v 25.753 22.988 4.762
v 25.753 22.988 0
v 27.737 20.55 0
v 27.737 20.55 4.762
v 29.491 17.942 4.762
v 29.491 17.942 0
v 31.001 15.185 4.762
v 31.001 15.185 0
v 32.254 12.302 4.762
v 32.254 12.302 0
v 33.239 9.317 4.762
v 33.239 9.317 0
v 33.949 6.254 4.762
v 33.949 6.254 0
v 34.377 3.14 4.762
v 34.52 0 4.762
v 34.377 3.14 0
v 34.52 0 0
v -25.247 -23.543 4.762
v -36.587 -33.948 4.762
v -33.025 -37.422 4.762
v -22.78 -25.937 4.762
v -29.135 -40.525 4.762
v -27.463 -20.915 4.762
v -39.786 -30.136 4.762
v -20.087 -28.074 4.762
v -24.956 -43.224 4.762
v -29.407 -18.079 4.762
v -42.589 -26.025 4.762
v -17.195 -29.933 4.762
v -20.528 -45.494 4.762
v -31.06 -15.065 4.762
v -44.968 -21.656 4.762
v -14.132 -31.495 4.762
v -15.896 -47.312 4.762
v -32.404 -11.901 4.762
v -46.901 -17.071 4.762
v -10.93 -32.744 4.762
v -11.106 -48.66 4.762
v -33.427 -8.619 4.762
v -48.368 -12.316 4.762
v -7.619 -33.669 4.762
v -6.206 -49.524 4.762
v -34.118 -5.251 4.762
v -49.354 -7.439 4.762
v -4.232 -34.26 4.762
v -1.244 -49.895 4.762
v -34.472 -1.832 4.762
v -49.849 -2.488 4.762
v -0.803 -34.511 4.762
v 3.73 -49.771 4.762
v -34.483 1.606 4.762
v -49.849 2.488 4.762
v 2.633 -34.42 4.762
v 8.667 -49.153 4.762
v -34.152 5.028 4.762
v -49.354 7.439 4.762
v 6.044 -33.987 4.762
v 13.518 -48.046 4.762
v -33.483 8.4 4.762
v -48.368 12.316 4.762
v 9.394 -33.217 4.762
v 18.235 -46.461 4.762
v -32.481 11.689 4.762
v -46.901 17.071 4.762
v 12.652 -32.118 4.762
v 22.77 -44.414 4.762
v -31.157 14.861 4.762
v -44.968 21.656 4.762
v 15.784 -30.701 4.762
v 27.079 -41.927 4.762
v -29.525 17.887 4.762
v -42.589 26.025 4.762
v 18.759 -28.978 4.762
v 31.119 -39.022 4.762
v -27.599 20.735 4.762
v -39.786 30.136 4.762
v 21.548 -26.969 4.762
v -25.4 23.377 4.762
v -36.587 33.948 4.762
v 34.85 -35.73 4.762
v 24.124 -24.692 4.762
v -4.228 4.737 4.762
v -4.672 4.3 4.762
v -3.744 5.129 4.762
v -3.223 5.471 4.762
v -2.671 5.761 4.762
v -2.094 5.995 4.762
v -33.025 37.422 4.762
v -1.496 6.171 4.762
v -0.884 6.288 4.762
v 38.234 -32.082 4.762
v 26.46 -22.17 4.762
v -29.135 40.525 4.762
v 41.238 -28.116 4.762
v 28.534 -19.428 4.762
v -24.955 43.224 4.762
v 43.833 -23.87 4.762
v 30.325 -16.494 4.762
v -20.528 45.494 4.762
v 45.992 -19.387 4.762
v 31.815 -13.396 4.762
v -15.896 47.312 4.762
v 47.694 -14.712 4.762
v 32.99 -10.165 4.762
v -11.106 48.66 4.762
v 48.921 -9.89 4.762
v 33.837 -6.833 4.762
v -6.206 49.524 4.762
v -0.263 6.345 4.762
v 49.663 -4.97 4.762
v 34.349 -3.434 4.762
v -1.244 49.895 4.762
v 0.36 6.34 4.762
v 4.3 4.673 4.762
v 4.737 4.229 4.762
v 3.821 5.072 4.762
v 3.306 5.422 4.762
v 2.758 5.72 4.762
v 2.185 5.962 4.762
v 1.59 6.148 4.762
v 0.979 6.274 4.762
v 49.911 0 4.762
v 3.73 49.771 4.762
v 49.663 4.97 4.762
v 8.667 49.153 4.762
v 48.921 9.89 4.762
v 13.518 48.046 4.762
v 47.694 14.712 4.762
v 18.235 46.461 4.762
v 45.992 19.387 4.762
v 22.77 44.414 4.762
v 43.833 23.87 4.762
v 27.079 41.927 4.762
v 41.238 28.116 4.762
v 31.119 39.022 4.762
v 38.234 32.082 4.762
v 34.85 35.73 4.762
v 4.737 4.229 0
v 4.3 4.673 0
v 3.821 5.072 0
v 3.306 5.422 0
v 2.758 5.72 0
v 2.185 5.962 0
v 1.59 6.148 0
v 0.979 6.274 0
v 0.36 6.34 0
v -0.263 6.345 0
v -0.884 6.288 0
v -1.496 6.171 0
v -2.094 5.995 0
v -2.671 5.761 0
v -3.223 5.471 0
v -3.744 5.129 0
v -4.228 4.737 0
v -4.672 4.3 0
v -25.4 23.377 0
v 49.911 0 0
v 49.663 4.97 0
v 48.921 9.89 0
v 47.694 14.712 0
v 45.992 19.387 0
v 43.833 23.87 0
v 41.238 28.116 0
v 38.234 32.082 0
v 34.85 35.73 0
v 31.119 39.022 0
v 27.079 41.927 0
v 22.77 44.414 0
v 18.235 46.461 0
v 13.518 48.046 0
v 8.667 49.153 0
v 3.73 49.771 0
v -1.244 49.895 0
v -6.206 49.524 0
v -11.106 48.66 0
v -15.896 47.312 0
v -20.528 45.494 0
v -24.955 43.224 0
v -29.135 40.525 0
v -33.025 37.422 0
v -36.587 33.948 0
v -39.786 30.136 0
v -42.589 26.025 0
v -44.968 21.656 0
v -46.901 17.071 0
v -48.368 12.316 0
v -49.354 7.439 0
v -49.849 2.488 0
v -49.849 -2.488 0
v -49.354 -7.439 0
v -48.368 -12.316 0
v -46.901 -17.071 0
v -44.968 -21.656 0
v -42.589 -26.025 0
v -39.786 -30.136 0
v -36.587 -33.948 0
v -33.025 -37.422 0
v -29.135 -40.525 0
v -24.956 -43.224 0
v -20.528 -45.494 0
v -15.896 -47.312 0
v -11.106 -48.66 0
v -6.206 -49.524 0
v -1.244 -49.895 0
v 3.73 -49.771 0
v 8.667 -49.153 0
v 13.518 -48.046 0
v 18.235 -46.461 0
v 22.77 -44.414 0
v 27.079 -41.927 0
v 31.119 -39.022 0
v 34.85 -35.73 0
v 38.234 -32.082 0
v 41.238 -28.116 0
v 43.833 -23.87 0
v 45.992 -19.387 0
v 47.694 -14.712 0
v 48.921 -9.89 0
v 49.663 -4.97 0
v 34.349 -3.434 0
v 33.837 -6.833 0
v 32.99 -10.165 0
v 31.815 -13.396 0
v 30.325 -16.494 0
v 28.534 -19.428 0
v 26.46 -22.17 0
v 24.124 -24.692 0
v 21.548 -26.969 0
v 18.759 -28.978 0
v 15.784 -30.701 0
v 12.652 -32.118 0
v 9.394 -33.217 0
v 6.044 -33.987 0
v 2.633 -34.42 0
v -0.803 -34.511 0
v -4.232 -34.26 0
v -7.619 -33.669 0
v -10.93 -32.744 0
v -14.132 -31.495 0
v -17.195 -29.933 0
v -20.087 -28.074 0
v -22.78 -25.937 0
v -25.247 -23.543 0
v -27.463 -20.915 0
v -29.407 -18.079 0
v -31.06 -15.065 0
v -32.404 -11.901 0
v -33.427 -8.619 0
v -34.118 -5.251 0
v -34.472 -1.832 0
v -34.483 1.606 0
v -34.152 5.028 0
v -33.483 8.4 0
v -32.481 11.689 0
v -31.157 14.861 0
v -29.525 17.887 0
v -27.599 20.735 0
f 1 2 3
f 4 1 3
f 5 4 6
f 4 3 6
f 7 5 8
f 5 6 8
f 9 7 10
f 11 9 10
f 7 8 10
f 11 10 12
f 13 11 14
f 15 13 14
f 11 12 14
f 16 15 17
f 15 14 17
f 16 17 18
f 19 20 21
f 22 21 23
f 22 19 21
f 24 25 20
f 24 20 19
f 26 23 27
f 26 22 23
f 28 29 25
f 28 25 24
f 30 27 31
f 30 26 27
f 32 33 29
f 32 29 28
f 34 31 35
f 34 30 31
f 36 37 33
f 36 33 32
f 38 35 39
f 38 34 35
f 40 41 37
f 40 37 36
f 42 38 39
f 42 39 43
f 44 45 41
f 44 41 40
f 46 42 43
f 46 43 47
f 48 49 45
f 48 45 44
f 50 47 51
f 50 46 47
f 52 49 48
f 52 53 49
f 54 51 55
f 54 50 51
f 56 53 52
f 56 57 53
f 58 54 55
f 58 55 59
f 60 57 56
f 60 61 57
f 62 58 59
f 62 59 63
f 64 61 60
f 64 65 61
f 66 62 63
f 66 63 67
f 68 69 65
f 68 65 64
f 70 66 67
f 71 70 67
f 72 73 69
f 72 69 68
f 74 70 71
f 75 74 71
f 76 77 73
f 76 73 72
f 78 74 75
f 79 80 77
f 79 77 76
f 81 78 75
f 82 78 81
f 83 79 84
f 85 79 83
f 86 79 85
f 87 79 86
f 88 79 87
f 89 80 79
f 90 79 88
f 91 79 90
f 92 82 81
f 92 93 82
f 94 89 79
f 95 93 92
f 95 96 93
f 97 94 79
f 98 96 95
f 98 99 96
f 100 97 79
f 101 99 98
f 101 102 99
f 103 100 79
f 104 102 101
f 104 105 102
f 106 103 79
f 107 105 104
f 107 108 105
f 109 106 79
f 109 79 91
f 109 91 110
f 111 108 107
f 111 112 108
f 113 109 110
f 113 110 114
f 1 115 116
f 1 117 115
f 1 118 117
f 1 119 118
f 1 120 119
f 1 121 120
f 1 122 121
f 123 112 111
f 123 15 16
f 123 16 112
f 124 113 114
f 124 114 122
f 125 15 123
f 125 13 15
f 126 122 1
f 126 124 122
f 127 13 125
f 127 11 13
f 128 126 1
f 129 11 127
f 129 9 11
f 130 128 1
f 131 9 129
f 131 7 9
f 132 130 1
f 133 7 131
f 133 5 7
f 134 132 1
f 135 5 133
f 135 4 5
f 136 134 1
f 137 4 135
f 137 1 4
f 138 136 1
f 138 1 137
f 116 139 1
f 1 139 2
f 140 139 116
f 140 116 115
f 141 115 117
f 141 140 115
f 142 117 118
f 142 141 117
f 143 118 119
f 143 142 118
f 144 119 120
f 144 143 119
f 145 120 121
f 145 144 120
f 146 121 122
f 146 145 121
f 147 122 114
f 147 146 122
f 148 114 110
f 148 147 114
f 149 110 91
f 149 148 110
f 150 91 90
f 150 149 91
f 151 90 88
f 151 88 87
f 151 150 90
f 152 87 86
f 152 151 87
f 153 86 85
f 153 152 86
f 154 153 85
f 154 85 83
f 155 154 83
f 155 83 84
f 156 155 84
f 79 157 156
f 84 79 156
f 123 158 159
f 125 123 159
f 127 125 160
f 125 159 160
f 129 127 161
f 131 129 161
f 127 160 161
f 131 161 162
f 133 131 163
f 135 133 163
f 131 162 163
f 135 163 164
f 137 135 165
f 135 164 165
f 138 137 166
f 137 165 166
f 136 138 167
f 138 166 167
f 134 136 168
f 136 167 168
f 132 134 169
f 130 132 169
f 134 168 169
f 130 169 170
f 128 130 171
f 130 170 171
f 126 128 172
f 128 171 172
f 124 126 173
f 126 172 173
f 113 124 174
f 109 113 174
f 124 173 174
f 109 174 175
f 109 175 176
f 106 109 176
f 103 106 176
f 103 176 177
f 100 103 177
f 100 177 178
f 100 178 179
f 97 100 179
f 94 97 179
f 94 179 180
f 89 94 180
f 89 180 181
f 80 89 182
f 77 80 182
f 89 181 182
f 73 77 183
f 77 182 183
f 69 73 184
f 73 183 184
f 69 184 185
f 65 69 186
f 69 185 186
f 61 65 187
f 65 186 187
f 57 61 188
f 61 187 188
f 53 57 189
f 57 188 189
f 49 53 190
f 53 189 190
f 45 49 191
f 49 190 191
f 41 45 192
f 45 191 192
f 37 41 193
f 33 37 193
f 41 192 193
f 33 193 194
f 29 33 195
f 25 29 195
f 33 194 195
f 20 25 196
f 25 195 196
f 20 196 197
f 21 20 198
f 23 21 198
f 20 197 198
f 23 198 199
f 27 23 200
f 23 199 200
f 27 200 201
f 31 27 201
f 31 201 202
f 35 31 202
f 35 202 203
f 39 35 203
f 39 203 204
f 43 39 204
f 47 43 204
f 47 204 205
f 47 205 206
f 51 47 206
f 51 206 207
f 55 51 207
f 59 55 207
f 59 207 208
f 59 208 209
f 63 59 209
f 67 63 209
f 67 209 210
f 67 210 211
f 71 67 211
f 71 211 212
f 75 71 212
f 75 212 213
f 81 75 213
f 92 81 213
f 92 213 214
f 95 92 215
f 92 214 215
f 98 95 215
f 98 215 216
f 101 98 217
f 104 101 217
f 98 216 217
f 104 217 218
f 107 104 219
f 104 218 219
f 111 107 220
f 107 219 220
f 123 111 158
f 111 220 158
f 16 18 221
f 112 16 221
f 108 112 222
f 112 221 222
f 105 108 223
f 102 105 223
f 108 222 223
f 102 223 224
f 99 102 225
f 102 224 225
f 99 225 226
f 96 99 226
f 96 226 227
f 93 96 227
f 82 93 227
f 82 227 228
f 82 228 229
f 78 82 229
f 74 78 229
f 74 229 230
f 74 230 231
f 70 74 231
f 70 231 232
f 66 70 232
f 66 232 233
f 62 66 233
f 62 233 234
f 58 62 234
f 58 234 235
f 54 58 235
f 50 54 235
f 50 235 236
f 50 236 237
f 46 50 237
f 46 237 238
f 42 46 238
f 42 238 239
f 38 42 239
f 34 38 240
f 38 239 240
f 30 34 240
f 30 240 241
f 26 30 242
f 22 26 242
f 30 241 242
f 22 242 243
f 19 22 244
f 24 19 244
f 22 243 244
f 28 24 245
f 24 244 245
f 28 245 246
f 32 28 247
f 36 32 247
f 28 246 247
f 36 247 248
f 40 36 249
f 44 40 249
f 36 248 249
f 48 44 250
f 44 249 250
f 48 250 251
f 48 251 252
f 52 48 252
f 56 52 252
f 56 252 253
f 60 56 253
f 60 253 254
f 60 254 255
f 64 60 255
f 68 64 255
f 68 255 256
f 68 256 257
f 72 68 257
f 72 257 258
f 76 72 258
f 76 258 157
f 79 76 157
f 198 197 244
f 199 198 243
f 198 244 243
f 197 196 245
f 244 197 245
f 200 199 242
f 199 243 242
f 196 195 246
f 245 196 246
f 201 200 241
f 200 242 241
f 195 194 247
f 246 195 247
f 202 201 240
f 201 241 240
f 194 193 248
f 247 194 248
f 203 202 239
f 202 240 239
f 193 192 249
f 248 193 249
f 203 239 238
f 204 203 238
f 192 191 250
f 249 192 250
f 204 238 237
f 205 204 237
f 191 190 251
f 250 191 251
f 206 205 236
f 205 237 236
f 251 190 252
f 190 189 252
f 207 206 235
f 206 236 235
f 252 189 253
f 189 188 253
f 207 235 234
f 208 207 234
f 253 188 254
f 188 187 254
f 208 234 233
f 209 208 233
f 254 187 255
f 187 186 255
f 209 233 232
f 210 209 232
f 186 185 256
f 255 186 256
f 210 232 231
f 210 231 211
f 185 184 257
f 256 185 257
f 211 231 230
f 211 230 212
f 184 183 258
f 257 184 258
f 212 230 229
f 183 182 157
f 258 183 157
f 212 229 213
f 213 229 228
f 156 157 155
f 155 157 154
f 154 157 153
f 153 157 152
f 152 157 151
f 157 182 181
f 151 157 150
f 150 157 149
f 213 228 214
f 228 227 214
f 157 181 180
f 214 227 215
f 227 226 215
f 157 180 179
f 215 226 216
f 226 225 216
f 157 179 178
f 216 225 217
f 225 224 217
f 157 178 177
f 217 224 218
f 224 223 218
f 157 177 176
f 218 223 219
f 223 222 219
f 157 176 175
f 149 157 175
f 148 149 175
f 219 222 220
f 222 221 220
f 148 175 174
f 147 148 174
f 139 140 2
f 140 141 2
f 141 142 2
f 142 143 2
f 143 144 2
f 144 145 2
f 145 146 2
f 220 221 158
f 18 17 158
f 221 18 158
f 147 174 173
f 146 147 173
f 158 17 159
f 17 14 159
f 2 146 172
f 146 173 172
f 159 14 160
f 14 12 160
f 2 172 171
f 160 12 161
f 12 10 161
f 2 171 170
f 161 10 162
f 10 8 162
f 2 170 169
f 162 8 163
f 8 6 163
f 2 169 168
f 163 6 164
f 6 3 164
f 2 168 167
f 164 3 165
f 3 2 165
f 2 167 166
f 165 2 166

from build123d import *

# Parameters (mm, degrees)
F0_R     = 49.911
F0_R_2   = 6.35
F1_DEPTH = 4.7625
F3_DEPTH = 9.144


with BuildPart() as f1:
    # F0 (on Top) → F1 (new body)
    with BuildSketch(Plane.XY):
        Circle(F0_R)
        Circle(F0_R_2, mode=Mode.SUBTRACT)
    extrude(amount=F1_DEPTH)

    # F2 (on face) → F3 (cut)
    with BuildSketch(Plane(origin=(0, 0, 0), x_dir=(1, 0, 0), z_dir=(0, 0, -1))):
        with BuildLine():
            ThreePointArc((25.7526882864, -22.9879649836), (32.253966126, -12.3015916531), (34.5202475087, 0))
            ThreePointArc((34.5202475087, 0), (-12.546596424, 32.1594528286), (-25.3999721233, -23.3771021343))
            Line((-25.3999721233, -23.3771021343), (-4.6723252185, -4.3002182564))
            ThreePointArc((-4.6723252185, -4.3002182564), (-2.3079465833, 5.9157317864), (6.35, 0))
            ThreePointArc((6.35, 0), (5.9331175088, -2.2628779524), (4.7372073615, -4.2286364722))
            Line((4.7372073615, -4.2286364722), (25.7526882864, -22.9879649836))
        make_face()
    extrude(amount=-F3_DEPTH, mode=Mode.SUBTRACT)


solid = f1.part
